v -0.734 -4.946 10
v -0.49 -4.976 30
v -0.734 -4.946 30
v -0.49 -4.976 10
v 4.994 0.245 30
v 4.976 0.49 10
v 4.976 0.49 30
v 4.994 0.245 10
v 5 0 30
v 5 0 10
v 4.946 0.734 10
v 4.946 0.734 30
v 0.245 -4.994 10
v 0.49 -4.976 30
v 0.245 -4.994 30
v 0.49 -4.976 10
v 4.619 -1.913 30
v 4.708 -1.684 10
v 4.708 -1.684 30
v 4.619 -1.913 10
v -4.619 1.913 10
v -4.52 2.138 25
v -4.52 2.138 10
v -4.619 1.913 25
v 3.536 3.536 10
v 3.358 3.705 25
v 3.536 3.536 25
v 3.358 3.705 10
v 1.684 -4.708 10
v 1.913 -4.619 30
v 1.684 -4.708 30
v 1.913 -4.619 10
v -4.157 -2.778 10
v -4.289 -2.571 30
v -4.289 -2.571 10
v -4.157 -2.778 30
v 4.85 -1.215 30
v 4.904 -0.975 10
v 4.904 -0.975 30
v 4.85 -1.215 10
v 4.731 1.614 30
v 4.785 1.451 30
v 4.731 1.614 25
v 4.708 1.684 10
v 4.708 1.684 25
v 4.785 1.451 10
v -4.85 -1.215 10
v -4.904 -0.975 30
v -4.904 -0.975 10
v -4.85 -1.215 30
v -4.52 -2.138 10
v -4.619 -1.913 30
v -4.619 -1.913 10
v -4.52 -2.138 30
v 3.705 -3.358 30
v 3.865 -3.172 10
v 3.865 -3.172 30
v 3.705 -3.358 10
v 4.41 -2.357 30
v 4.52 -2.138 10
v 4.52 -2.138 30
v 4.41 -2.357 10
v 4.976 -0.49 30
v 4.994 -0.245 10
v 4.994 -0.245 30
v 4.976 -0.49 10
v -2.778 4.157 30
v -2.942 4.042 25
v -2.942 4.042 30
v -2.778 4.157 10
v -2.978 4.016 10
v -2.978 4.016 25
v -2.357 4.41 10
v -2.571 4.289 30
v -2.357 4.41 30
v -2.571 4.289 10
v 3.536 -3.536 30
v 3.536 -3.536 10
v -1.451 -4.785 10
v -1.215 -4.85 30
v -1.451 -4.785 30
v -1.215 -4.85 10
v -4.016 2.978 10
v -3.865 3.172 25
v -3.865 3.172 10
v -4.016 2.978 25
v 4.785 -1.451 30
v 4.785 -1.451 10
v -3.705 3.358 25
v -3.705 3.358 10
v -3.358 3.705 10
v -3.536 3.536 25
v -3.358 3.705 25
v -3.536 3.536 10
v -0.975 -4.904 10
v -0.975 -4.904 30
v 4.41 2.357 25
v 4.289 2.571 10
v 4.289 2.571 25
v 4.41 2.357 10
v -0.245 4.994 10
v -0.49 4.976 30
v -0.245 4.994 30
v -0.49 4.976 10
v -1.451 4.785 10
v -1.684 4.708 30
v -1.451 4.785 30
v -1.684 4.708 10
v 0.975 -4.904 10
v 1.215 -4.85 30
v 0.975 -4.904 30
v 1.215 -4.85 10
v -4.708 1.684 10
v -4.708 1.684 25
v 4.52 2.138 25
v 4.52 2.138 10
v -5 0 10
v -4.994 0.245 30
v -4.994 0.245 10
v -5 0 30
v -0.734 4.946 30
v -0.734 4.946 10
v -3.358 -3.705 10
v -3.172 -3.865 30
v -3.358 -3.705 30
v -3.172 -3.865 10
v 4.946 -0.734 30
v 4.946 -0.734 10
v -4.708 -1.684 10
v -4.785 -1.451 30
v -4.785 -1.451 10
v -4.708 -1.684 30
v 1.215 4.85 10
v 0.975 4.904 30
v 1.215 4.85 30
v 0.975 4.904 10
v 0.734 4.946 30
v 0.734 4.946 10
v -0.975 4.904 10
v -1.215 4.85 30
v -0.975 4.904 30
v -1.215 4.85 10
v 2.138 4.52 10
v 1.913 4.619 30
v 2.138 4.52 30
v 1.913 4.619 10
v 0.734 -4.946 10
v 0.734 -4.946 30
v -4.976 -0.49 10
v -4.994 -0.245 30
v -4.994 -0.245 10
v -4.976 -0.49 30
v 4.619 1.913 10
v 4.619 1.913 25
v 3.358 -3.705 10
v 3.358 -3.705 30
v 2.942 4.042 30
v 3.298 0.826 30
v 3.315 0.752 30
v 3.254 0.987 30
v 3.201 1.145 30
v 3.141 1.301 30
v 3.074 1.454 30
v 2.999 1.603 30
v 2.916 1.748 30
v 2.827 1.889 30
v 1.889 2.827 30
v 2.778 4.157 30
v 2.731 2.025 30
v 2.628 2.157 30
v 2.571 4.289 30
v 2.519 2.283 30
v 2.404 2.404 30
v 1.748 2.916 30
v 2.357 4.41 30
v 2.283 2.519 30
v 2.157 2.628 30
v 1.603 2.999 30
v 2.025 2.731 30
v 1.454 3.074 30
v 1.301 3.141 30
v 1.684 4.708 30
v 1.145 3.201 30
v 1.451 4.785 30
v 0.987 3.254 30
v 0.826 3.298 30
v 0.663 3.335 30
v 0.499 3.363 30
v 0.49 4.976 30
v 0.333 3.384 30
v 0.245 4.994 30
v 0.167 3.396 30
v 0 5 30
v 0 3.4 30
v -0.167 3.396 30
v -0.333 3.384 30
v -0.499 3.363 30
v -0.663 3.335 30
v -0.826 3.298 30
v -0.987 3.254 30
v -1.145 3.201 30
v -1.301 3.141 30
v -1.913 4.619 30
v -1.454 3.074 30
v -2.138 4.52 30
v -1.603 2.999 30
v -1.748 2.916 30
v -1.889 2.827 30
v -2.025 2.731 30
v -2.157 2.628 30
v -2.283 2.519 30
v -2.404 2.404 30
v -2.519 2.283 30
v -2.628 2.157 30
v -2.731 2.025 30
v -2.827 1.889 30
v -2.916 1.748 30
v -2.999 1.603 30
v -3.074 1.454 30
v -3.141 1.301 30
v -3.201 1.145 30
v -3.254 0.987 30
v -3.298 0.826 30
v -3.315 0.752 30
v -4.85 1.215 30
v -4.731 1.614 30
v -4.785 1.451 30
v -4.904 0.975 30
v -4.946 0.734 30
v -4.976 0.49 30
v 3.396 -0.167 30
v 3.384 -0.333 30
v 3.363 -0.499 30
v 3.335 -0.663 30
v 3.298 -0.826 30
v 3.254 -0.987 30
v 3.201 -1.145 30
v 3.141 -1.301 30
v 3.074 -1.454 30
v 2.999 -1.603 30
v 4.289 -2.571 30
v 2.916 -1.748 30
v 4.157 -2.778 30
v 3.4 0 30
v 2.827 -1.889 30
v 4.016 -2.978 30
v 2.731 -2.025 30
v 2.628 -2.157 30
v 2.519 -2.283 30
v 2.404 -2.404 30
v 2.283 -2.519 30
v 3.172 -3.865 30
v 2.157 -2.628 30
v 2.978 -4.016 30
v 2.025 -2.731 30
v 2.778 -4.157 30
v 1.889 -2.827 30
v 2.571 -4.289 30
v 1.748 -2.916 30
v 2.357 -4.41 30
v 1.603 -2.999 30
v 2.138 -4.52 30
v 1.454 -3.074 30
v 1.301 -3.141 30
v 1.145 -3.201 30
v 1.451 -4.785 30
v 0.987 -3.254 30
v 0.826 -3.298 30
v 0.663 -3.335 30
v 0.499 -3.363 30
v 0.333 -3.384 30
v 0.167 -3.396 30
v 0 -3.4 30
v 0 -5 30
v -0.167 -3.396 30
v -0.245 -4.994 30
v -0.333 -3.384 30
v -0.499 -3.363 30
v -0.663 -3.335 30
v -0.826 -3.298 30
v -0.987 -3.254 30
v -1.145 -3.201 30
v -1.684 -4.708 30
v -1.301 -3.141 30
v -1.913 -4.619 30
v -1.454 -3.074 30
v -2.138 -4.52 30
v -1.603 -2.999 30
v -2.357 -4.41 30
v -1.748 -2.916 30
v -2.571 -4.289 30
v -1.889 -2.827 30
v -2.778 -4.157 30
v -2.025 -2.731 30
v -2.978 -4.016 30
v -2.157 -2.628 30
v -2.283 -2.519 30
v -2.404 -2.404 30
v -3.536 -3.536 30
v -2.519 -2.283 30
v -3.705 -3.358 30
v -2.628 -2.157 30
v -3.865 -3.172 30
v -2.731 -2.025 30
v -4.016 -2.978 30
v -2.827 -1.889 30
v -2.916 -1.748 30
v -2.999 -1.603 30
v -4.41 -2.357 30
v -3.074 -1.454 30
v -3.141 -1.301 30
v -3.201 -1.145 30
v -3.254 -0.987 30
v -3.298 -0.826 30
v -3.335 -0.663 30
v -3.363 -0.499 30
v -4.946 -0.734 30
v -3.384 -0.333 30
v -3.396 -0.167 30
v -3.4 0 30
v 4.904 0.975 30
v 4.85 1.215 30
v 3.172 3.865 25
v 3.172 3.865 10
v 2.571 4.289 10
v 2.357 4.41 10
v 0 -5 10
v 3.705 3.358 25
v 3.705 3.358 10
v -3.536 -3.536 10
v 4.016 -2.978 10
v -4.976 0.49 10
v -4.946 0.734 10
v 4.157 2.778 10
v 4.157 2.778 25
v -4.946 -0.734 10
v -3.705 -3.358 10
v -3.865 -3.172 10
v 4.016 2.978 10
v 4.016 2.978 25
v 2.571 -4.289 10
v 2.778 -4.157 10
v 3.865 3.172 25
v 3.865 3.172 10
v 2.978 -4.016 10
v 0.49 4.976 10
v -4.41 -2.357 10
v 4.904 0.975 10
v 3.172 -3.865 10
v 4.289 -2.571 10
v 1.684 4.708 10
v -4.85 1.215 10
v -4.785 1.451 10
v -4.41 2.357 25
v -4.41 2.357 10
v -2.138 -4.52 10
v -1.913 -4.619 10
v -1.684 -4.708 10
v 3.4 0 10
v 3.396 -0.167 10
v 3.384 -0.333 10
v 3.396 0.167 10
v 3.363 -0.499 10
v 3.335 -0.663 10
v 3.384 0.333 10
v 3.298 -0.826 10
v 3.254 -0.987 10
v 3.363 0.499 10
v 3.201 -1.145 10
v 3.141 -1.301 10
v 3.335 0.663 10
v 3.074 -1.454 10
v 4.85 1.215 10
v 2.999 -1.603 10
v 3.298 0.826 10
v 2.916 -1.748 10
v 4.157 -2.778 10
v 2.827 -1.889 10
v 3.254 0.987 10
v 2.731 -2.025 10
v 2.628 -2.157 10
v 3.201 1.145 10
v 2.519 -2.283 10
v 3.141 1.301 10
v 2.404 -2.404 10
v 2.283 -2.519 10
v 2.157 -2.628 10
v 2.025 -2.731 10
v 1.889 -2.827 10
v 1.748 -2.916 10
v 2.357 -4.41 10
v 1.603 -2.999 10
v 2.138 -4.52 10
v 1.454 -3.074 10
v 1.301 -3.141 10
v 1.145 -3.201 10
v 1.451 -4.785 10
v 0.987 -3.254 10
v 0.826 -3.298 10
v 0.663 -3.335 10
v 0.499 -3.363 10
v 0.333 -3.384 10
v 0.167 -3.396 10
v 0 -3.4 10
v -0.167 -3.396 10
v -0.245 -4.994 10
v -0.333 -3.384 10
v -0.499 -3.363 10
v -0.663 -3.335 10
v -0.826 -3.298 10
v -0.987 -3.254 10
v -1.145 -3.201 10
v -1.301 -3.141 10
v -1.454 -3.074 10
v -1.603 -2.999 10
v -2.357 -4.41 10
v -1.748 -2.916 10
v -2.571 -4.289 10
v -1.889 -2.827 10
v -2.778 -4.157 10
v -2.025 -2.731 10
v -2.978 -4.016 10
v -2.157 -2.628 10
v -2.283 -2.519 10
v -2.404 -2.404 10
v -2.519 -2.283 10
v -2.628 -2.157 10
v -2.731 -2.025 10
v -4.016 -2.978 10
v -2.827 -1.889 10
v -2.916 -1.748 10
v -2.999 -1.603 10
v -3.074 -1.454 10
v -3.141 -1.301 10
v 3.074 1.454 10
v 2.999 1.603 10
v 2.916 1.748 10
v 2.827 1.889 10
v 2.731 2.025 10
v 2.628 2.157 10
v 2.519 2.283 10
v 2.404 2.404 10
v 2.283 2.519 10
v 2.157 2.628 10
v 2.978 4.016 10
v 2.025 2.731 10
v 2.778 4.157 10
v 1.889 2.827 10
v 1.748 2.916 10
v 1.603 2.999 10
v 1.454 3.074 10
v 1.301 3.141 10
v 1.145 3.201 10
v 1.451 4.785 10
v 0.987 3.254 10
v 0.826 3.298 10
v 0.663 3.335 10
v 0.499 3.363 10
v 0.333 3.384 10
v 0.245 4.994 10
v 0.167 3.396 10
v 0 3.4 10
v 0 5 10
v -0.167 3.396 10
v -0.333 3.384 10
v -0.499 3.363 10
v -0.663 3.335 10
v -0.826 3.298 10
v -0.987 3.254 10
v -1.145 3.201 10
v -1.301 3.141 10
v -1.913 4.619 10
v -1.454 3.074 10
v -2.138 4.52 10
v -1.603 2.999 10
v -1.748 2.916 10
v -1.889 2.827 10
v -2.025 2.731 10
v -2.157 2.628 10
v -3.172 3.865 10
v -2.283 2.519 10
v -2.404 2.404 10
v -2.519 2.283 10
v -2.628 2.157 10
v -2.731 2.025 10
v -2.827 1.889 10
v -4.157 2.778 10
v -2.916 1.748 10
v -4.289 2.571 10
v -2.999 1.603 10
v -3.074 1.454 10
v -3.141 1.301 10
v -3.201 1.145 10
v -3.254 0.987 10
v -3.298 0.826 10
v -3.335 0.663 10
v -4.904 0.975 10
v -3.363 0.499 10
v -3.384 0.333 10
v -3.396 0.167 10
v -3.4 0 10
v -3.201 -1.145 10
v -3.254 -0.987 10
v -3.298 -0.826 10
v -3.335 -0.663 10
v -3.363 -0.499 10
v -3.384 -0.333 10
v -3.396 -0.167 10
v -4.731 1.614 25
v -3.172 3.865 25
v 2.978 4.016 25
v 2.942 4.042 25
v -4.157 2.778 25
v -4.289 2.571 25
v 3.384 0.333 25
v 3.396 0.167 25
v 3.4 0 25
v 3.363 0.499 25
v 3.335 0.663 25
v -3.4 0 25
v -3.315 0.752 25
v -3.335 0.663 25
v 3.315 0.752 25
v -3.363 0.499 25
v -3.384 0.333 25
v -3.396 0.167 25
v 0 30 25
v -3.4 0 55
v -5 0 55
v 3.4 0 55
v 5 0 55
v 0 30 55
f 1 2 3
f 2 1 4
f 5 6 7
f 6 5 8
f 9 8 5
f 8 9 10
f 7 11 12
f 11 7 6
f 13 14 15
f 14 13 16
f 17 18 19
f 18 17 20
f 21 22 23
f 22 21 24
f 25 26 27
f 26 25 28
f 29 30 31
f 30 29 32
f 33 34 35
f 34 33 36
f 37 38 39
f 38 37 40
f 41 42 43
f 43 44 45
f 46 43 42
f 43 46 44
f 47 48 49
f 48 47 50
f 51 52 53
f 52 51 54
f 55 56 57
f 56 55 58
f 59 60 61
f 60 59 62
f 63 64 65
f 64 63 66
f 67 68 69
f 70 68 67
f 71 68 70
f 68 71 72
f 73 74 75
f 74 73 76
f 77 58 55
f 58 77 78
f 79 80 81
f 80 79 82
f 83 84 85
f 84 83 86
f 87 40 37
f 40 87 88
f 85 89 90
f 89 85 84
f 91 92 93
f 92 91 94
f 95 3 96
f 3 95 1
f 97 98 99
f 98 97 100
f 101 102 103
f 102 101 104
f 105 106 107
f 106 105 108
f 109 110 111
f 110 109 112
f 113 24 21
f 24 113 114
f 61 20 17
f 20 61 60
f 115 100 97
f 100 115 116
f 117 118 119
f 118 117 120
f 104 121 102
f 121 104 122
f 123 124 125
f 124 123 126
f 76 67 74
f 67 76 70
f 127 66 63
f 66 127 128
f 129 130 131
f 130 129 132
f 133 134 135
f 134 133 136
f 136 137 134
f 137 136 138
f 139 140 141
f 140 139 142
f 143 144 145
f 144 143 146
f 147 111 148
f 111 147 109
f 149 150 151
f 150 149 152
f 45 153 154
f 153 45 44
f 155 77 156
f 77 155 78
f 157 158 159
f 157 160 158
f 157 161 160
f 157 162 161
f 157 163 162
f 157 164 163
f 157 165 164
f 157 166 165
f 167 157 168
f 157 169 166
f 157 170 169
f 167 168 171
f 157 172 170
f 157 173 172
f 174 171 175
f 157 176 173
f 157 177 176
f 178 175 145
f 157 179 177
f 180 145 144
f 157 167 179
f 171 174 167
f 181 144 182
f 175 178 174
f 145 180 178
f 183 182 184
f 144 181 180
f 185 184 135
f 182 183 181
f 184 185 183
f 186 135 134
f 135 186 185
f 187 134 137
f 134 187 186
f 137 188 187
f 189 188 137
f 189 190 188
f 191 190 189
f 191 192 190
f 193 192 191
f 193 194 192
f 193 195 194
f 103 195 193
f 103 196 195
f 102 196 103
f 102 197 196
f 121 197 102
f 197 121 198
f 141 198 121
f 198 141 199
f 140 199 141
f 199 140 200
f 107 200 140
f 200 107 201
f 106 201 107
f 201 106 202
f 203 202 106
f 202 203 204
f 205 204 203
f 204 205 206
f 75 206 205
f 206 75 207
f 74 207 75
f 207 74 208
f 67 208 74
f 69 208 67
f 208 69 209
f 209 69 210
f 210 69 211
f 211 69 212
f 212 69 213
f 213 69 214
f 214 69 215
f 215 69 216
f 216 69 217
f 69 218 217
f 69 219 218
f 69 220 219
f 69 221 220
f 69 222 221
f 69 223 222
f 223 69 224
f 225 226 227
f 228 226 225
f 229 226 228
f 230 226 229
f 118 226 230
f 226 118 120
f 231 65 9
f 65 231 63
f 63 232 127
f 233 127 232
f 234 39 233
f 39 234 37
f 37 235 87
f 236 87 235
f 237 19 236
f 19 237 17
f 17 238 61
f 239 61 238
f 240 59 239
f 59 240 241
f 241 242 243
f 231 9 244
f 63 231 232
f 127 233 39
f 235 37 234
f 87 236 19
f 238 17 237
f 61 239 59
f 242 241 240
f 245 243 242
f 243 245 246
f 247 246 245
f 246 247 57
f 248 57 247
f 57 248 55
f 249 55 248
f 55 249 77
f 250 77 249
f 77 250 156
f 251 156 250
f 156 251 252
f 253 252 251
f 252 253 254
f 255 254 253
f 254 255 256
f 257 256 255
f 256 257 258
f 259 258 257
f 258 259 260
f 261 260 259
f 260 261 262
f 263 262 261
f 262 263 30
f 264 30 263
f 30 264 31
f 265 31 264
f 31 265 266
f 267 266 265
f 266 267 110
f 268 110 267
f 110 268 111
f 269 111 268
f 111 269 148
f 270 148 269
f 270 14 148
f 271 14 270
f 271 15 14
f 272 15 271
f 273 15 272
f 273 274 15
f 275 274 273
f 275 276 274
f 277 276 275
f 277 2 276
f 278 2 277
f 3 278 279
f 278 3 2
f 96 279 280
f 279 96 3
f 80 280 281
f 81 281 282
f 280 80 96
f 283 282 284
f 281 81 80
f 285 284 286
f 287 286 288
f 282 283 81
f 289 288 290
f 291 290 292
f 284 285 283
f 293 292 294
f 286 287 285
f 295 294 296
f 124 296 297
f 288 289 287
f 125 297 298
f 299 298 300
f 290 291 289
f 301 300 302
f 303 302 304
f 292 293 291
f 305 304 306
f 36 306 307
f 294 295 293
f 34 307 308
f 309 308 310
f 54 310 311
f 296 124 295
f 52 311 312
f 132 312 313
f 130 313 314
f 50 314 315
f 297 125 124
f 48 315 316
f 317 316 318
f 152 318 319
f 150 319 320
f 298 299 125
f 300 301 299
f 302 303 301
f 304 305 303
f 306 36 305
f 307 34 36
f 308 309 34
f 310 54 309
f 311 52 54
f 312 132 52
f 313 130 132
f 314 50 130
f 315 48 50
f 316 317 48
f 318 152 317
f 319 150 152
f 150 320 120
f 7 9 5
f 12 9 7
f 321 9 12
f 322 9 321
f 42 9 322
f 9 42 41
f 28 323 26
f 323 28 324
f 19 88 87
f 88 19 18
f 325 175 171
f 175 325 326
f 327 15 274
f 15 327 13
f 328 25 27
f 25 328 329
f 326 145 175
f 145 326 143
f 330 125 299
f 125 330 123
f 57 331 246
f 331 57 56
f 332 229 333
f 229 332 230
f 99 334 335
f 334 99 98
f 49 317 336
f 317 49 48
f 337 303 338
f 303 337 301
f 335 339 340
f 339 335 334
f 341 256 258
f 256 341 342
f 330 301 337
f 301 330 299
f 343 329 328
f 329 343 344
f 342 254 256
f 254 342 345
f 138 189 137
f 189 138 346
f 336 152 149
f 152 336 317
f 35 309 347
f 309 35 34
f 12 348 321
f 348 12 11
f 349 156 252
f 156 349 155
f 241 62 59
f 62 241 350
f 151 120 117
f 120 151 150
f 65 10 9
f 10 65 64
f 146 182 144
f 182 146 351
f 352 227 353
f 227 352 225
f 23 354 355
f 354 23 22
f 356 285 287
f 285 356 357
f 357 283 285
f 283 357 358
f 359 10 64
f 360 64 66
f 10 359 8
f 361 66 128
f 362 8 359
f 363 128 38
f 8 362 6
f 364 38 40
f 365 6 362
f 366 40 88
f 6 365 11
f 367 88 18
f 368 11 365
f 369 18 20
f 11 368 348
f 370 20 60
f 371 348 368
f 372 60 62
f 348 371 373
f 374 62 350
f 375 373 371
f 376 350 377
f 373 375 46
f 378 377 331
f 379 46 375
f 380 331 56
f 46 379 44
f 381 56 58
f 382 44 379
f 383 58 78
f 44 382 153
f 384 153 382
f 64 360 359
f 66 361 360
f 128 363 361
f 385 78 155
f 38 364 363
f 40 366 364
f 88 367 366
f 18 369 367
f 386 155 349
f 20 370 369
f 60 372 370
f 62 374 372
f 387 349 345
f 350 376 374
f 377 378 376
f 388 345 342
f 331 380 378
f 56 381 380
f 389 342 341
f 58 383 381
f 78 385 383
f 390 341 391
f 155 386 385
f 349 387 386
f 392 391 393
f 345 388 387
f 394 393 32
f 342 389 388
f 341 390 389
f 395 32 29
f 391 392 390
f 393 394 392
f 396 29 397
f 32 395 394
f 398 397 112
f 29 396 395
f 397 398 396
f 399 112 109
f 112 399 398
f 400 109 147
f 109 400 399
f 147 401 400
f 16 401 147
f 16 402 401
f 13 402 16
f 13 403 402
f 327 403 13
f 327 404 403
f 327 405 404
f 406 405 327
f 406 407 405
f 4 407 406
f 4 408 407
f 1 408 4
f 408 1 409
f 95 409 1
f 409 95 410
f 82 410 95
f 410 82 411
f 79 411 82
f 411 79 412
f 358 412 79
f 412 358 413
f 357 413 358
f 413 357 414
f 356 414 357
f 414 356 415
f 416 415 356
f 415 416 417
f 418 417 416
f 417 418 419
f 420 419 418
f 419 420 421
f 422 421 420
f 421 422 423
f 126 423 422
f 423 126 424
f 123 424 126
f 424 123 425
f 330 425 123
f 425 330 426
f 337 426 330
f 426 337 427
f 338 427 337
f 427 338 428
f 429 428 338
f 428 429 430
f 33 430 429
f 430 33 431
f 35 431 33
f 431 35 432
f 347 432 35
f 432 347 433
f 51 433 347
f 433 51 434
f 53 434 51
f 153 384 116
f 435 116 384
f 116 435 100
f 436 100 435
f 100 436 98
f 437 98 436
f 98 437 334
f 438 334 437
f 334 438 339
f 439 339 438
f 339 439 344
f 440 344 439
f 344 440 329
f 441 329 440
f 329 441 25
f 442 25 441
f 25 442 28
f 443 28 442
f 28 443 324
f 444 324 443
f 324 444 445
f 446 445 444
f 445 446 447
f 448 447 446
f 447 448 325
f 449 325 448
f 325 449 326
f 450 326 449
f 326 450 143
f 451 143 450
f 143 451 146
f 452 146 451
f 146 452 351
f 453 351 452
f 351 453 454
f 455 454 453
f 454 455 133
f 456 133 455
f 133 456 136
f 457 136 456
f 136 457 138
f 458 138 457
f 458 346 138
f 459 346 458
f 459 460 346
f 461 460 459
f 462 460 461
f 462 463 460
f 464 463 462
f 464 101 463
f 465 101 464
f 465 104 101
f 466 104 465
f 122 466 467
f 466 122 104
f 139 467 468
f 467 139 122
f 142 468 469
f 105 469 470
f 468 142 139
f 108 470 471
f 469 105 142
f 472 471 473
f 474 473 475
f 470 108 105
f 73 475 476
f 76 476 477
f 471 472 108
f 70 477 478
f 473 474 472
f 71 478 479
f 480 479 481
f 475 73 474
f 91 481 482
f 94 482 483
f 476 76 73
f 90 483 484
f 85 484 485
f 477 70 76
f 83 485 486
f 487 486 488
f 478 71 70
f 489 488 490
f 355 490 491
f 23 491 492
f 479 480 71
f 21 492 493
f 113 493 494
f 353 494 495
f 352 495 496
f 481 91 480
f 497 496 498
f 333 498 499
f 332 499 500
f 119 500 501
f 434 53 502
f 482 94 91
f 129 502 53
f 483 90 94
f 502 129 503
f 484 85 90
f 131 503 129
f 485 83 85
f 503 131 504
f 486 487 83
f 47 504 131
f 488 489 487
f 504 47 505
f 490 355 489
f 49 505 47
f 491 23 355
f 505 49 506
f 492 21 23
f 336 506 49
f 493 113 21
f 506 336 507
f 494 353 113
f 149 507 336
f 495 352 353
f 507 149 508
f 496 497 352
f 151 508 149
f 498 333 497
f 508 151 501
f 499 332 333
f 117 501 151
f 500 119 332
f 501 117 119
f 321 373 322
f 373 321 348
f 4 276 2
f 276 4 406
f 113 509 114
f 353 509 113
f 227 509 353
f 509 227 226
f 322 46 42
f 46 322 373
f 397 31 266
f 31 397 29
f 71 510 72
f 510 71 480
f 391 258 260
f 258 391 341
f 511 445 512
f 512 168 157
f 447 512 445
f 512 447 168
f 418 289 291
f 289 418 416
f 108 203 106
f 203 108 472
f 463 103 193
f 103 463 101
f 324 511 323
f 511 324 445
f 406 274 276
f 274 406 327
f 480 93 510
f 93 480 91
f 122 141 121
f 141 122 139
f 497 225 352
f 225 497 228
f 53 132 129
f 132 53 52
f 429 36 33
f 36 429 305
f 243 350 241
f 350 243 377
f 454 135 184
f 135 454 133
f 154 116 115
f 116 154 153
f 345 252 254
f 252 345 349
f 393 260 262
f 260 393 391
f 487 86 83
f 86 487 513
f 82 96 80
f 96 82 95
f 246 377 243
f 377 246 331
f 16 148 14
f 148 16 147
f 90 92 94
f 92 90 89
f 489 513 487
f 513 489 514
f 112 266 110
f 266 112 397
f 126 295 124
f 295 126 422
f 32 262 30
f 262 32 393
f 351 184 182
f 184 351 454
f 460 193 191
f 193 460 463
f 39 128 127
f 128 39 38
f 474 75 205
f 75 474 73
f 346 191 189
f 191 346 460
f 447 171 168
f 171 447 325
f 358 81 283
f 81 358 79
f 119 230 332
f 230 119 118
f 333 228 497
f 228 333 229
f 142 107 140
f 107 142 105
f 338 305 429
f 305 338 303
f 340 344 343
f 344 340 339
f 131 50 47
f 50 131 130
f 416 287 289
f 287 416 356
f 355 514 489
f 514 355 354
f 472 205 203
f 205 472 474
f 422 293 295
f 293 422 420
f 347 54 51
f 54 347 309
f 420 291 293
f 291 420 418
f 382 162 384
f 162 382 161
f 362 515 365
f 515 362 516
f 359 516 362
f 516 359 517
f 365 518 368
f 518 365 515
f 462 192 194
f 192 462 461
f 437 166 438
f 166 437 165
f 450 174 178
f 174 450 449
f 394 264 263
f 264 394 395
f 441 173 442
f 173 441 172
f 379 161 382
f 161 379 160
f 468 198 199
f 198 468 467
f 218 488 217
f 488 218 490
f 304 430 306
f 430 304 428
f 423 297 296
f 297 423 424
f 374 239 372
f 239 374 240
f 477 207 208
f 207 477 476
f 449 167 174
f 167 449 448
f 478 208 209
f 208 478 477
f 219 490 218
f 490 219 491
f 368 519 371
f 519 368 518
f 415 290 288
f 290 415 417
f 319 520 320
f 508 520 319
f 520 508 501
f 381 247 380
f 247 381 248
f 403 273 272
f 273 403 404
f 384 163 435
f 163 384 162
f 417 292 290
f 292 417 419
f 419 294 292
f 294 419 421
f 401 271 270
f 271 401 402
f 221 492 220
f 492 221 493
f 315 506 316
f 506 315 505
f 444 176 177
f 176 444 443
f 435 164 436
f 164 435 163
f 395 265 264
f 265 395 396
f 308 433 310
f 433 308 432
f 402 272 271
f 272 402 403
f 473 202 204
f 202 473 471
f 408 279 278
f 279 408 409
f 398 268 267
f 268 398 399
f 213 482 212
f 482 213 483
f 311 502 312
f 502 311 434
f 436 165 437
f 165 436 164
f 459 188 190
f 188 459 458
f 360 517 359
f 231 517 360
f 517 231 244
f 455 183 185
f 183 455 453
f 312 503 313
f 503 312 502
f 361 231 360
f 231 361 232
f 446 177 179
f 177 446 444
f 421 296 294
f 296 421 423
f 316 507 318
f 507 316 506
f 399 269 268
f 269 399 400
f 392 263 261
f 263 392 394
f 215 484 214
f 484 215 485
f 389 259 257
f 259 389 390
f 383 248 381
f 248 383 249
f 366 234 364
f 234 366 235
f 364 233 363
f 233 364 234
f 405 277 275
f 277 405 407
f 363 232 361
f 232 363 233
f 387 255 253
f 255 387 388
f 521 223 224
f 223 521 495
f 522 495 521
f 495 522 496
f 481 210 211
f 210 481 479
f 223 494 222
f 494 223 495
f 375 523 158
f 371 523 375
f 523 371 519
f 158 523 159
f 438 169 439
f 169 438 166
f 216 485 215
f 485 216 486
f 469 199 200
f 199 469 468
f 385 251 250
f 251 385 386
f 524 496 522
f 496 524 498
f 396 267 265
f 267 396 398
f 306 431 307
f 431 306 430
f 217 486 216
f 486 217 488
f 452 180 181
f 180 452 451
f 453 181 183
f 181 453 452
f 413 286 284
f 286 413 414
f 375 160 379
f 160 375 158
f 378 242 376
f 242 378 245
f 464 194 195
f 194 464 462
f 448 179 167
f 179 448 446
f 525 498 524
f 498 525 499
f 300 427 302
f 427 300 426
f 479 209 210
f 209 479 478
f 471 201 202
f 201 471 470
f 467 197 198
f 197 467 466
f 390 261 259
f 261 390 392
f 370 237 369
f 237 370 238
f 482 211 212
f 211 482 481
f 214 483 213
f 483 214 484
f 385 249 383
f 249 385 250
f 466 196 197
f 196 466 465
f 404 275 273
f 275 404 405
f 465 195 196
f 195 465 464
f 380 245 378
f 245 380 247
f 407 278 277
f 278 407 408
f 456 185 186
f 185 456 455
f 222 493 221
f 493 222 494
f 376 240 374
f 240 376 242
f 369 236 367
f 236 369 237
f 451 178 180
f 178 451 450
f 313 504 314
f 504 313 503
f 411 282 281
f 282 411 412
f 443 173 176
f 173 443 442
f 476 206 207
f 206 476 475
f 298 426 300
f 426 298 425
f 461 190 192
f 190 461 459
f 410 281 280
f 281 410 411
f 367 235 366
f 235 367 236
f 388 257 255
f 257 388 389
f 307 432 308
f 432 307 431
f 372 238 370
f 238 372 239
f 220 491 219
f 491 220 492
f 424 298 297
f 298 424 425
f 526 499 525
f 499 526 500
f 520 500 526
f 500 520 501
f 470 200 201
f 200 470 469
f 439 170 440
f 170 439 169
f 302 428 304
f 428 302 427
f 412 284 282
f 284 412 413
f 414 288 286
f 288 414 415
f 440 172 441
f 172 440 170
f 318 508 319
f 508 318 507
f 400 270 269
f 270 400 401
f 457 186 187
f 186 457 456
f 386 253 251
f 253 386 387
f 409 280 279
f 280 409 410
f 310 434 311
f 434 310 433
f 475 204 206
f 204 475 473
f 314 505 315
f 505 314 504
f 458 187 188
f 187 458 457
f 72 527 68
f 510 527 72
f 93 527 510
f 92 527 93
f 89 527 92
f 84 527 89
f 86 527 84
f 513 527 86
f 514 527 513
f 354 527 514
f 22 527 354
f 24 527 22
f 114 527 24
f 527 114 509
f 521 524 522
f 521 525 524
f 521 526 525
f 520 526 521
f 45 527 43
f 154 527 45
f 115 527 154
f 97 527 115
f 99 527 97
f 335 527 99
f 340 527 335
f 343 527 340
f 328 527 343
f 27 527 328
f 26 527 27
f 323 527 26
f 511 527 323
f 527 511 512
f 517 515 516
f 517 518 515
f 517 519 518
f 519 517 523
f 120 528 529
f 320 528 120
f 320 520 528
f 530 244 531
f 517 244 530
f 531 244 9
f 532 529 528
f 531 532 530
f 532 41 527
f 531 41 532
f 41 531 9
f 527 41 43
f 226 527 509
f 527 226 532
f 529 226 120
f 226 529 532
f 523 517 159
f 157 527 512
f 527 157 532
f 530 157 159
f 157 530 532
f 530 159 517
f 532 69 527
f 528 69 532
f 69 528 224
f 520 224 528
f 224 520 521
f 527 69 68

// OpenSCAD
// Lab Funnel Design
// Units: millimetres
// Orientation: Upright, wide opening at top, rests on XY plane at z=0.

// Dimensions
$fn = 128; // High resolution for smooth curves

// Spout (Tube)
spout_outer_diameter = 10;
spout_inner_diameter = 6.8; // 10 - 2*1.6
spout_length = 20;
spout_wall_thickness = 1.6;

// Cone (Funnel)
cone_bottom_diameter = 10; // Matches spout outer diameter
cone_top_diameter = 60;
cone_height = 30; // From z=20 to z=50

// Wall Thickness (consistent)
wall_thickness = 1.6;

// Helper function to create a hollow cylinder segment
// center: [x, y, z]
// outer_d: outer diameter
// inner_d: inner diameter
// height: height of segment
// direction: 1 for +Z, -1 for -Z
module hollow_cylinder(center, outer_d, inner_d, height, direction) {
    translate(center) {
        difference() {
            // Outer shell
            cylinder(h = height, d = outer_d, $fn = $fn);
            // Inner void
            cylinder(h = height, d = inner_d, $fn = $fn);
        }
    }
}

// Helper function to create a hollow cone segment
// center: [x, y, z]
// bottom_d: outer diameter at bottom of cone
// top_d: outer diameter at top of cone
// height: height of cone
// direction: 1 for +Z, -1 for -Z
module hollow_cone(center, bottom_d, top_d, height, direction) {
    translate(center) {
        difference() {
            // Outer shell
            linear_extrude(height = height, center = true, convexity = 3) {
                // Outer profile: triangle pointing up if direction=1, down if direction=-1
                // We define the profile relative to the center of the cone base
                if (direction == 1) {
                    // Pointing up: base at bottom, tip at top
                    polygon(points = [
                        [-bottom_d/2, 0],
                        [bottom_d/2, 0],
                        [0, height]
                    ]);
                } else {
                    // Pointing down: base at top, tip at bottom
                    polygon(points = [
                        [-top_d/2, 0],
                        [top_d/2, 0],
                        [0, -height]
                    ]);
                }
            }
            
            // Inner void (inverted cone)
            // Calculate inner diameters at the specific ends of this cone segment
            // The cone tapers linearly.
            // Let's define the inner profile similarly.
            // We need the inner diameter at the "bottom" of this segment and "top" of this segment.
            
            // If direction = 1 (growing +Z):
            // Bottom is at z=0 (relative), Top is at z=height.
            // Outer diameters: bottom_d, top_d.
            // Inner diameters: bottom_d - 2*wall, top_d - 2*wall.
            
            // If direction = -1 (growing -Z):
            // Bottom is at z=0 (relative), Top is at z=-height.
            // Outer diameters: top_d (at z=0), bottom_d (at z=-height).
            // Inner diameters: top_d - 2*wall, bottom_d - 2*wall.
            
            // Let's normalize the logic:
            // We always extrude a polygon from y=0 to y=height (or -height).
            // We calculate the inner diameters corresponding to the outer diameters at those heights.
            
            inner_bottom_d = bottom_d - 2 * wall_thickness;
            inner_top_d = top_d - 2 * wall_thickness;
            
            if (direction == 1) {
                // Pointing up
                linear_extrude(height = height, center = true, convexity = 3) {
                    polygon(points = [
                        [-inner_bottom_d/2, 0],
                        [inner_bottom_d/2, 0],
                        [0, height]
                    ]);
                }
            } else {
                // Pointing down
                linear_extrude(height = height, center = true, convexity = 3) {
                    polygon(points = [
                        [-inner_top_d/2, 0],
                        [inner_top_d/2, 0],
                        [0, -height]
                    ]);
                }
            }
        }
    }
}

// --- Assembly ---

// 1. Spout (Cylinder)
// Located at z = 0 to z = 20.
// Center at z = 10.
hollow_cylinder(
    center = [0, 0, spout_length/2],
    outer_d = spout_outer_diameter,
    inner_d = spout_inner_diameter,
    height = spout_length,
    direction = 1
);

// 2. Cone (Funnel)
// Located at z = 20 to z = 50.
// Bottom diameter (at z=20) = 10.
// Top diameter (at z=50) = 60.
// Center at z = 35.
// Direction = 1 (pointing up).
hollow_cone(
    center = [0, 0, cone_height + spout_length/2],
    bottom_d = cone_bottom_diameter,
    top_d = cone_top_diameter,
    height = cone_height,
    direction = 1
);
